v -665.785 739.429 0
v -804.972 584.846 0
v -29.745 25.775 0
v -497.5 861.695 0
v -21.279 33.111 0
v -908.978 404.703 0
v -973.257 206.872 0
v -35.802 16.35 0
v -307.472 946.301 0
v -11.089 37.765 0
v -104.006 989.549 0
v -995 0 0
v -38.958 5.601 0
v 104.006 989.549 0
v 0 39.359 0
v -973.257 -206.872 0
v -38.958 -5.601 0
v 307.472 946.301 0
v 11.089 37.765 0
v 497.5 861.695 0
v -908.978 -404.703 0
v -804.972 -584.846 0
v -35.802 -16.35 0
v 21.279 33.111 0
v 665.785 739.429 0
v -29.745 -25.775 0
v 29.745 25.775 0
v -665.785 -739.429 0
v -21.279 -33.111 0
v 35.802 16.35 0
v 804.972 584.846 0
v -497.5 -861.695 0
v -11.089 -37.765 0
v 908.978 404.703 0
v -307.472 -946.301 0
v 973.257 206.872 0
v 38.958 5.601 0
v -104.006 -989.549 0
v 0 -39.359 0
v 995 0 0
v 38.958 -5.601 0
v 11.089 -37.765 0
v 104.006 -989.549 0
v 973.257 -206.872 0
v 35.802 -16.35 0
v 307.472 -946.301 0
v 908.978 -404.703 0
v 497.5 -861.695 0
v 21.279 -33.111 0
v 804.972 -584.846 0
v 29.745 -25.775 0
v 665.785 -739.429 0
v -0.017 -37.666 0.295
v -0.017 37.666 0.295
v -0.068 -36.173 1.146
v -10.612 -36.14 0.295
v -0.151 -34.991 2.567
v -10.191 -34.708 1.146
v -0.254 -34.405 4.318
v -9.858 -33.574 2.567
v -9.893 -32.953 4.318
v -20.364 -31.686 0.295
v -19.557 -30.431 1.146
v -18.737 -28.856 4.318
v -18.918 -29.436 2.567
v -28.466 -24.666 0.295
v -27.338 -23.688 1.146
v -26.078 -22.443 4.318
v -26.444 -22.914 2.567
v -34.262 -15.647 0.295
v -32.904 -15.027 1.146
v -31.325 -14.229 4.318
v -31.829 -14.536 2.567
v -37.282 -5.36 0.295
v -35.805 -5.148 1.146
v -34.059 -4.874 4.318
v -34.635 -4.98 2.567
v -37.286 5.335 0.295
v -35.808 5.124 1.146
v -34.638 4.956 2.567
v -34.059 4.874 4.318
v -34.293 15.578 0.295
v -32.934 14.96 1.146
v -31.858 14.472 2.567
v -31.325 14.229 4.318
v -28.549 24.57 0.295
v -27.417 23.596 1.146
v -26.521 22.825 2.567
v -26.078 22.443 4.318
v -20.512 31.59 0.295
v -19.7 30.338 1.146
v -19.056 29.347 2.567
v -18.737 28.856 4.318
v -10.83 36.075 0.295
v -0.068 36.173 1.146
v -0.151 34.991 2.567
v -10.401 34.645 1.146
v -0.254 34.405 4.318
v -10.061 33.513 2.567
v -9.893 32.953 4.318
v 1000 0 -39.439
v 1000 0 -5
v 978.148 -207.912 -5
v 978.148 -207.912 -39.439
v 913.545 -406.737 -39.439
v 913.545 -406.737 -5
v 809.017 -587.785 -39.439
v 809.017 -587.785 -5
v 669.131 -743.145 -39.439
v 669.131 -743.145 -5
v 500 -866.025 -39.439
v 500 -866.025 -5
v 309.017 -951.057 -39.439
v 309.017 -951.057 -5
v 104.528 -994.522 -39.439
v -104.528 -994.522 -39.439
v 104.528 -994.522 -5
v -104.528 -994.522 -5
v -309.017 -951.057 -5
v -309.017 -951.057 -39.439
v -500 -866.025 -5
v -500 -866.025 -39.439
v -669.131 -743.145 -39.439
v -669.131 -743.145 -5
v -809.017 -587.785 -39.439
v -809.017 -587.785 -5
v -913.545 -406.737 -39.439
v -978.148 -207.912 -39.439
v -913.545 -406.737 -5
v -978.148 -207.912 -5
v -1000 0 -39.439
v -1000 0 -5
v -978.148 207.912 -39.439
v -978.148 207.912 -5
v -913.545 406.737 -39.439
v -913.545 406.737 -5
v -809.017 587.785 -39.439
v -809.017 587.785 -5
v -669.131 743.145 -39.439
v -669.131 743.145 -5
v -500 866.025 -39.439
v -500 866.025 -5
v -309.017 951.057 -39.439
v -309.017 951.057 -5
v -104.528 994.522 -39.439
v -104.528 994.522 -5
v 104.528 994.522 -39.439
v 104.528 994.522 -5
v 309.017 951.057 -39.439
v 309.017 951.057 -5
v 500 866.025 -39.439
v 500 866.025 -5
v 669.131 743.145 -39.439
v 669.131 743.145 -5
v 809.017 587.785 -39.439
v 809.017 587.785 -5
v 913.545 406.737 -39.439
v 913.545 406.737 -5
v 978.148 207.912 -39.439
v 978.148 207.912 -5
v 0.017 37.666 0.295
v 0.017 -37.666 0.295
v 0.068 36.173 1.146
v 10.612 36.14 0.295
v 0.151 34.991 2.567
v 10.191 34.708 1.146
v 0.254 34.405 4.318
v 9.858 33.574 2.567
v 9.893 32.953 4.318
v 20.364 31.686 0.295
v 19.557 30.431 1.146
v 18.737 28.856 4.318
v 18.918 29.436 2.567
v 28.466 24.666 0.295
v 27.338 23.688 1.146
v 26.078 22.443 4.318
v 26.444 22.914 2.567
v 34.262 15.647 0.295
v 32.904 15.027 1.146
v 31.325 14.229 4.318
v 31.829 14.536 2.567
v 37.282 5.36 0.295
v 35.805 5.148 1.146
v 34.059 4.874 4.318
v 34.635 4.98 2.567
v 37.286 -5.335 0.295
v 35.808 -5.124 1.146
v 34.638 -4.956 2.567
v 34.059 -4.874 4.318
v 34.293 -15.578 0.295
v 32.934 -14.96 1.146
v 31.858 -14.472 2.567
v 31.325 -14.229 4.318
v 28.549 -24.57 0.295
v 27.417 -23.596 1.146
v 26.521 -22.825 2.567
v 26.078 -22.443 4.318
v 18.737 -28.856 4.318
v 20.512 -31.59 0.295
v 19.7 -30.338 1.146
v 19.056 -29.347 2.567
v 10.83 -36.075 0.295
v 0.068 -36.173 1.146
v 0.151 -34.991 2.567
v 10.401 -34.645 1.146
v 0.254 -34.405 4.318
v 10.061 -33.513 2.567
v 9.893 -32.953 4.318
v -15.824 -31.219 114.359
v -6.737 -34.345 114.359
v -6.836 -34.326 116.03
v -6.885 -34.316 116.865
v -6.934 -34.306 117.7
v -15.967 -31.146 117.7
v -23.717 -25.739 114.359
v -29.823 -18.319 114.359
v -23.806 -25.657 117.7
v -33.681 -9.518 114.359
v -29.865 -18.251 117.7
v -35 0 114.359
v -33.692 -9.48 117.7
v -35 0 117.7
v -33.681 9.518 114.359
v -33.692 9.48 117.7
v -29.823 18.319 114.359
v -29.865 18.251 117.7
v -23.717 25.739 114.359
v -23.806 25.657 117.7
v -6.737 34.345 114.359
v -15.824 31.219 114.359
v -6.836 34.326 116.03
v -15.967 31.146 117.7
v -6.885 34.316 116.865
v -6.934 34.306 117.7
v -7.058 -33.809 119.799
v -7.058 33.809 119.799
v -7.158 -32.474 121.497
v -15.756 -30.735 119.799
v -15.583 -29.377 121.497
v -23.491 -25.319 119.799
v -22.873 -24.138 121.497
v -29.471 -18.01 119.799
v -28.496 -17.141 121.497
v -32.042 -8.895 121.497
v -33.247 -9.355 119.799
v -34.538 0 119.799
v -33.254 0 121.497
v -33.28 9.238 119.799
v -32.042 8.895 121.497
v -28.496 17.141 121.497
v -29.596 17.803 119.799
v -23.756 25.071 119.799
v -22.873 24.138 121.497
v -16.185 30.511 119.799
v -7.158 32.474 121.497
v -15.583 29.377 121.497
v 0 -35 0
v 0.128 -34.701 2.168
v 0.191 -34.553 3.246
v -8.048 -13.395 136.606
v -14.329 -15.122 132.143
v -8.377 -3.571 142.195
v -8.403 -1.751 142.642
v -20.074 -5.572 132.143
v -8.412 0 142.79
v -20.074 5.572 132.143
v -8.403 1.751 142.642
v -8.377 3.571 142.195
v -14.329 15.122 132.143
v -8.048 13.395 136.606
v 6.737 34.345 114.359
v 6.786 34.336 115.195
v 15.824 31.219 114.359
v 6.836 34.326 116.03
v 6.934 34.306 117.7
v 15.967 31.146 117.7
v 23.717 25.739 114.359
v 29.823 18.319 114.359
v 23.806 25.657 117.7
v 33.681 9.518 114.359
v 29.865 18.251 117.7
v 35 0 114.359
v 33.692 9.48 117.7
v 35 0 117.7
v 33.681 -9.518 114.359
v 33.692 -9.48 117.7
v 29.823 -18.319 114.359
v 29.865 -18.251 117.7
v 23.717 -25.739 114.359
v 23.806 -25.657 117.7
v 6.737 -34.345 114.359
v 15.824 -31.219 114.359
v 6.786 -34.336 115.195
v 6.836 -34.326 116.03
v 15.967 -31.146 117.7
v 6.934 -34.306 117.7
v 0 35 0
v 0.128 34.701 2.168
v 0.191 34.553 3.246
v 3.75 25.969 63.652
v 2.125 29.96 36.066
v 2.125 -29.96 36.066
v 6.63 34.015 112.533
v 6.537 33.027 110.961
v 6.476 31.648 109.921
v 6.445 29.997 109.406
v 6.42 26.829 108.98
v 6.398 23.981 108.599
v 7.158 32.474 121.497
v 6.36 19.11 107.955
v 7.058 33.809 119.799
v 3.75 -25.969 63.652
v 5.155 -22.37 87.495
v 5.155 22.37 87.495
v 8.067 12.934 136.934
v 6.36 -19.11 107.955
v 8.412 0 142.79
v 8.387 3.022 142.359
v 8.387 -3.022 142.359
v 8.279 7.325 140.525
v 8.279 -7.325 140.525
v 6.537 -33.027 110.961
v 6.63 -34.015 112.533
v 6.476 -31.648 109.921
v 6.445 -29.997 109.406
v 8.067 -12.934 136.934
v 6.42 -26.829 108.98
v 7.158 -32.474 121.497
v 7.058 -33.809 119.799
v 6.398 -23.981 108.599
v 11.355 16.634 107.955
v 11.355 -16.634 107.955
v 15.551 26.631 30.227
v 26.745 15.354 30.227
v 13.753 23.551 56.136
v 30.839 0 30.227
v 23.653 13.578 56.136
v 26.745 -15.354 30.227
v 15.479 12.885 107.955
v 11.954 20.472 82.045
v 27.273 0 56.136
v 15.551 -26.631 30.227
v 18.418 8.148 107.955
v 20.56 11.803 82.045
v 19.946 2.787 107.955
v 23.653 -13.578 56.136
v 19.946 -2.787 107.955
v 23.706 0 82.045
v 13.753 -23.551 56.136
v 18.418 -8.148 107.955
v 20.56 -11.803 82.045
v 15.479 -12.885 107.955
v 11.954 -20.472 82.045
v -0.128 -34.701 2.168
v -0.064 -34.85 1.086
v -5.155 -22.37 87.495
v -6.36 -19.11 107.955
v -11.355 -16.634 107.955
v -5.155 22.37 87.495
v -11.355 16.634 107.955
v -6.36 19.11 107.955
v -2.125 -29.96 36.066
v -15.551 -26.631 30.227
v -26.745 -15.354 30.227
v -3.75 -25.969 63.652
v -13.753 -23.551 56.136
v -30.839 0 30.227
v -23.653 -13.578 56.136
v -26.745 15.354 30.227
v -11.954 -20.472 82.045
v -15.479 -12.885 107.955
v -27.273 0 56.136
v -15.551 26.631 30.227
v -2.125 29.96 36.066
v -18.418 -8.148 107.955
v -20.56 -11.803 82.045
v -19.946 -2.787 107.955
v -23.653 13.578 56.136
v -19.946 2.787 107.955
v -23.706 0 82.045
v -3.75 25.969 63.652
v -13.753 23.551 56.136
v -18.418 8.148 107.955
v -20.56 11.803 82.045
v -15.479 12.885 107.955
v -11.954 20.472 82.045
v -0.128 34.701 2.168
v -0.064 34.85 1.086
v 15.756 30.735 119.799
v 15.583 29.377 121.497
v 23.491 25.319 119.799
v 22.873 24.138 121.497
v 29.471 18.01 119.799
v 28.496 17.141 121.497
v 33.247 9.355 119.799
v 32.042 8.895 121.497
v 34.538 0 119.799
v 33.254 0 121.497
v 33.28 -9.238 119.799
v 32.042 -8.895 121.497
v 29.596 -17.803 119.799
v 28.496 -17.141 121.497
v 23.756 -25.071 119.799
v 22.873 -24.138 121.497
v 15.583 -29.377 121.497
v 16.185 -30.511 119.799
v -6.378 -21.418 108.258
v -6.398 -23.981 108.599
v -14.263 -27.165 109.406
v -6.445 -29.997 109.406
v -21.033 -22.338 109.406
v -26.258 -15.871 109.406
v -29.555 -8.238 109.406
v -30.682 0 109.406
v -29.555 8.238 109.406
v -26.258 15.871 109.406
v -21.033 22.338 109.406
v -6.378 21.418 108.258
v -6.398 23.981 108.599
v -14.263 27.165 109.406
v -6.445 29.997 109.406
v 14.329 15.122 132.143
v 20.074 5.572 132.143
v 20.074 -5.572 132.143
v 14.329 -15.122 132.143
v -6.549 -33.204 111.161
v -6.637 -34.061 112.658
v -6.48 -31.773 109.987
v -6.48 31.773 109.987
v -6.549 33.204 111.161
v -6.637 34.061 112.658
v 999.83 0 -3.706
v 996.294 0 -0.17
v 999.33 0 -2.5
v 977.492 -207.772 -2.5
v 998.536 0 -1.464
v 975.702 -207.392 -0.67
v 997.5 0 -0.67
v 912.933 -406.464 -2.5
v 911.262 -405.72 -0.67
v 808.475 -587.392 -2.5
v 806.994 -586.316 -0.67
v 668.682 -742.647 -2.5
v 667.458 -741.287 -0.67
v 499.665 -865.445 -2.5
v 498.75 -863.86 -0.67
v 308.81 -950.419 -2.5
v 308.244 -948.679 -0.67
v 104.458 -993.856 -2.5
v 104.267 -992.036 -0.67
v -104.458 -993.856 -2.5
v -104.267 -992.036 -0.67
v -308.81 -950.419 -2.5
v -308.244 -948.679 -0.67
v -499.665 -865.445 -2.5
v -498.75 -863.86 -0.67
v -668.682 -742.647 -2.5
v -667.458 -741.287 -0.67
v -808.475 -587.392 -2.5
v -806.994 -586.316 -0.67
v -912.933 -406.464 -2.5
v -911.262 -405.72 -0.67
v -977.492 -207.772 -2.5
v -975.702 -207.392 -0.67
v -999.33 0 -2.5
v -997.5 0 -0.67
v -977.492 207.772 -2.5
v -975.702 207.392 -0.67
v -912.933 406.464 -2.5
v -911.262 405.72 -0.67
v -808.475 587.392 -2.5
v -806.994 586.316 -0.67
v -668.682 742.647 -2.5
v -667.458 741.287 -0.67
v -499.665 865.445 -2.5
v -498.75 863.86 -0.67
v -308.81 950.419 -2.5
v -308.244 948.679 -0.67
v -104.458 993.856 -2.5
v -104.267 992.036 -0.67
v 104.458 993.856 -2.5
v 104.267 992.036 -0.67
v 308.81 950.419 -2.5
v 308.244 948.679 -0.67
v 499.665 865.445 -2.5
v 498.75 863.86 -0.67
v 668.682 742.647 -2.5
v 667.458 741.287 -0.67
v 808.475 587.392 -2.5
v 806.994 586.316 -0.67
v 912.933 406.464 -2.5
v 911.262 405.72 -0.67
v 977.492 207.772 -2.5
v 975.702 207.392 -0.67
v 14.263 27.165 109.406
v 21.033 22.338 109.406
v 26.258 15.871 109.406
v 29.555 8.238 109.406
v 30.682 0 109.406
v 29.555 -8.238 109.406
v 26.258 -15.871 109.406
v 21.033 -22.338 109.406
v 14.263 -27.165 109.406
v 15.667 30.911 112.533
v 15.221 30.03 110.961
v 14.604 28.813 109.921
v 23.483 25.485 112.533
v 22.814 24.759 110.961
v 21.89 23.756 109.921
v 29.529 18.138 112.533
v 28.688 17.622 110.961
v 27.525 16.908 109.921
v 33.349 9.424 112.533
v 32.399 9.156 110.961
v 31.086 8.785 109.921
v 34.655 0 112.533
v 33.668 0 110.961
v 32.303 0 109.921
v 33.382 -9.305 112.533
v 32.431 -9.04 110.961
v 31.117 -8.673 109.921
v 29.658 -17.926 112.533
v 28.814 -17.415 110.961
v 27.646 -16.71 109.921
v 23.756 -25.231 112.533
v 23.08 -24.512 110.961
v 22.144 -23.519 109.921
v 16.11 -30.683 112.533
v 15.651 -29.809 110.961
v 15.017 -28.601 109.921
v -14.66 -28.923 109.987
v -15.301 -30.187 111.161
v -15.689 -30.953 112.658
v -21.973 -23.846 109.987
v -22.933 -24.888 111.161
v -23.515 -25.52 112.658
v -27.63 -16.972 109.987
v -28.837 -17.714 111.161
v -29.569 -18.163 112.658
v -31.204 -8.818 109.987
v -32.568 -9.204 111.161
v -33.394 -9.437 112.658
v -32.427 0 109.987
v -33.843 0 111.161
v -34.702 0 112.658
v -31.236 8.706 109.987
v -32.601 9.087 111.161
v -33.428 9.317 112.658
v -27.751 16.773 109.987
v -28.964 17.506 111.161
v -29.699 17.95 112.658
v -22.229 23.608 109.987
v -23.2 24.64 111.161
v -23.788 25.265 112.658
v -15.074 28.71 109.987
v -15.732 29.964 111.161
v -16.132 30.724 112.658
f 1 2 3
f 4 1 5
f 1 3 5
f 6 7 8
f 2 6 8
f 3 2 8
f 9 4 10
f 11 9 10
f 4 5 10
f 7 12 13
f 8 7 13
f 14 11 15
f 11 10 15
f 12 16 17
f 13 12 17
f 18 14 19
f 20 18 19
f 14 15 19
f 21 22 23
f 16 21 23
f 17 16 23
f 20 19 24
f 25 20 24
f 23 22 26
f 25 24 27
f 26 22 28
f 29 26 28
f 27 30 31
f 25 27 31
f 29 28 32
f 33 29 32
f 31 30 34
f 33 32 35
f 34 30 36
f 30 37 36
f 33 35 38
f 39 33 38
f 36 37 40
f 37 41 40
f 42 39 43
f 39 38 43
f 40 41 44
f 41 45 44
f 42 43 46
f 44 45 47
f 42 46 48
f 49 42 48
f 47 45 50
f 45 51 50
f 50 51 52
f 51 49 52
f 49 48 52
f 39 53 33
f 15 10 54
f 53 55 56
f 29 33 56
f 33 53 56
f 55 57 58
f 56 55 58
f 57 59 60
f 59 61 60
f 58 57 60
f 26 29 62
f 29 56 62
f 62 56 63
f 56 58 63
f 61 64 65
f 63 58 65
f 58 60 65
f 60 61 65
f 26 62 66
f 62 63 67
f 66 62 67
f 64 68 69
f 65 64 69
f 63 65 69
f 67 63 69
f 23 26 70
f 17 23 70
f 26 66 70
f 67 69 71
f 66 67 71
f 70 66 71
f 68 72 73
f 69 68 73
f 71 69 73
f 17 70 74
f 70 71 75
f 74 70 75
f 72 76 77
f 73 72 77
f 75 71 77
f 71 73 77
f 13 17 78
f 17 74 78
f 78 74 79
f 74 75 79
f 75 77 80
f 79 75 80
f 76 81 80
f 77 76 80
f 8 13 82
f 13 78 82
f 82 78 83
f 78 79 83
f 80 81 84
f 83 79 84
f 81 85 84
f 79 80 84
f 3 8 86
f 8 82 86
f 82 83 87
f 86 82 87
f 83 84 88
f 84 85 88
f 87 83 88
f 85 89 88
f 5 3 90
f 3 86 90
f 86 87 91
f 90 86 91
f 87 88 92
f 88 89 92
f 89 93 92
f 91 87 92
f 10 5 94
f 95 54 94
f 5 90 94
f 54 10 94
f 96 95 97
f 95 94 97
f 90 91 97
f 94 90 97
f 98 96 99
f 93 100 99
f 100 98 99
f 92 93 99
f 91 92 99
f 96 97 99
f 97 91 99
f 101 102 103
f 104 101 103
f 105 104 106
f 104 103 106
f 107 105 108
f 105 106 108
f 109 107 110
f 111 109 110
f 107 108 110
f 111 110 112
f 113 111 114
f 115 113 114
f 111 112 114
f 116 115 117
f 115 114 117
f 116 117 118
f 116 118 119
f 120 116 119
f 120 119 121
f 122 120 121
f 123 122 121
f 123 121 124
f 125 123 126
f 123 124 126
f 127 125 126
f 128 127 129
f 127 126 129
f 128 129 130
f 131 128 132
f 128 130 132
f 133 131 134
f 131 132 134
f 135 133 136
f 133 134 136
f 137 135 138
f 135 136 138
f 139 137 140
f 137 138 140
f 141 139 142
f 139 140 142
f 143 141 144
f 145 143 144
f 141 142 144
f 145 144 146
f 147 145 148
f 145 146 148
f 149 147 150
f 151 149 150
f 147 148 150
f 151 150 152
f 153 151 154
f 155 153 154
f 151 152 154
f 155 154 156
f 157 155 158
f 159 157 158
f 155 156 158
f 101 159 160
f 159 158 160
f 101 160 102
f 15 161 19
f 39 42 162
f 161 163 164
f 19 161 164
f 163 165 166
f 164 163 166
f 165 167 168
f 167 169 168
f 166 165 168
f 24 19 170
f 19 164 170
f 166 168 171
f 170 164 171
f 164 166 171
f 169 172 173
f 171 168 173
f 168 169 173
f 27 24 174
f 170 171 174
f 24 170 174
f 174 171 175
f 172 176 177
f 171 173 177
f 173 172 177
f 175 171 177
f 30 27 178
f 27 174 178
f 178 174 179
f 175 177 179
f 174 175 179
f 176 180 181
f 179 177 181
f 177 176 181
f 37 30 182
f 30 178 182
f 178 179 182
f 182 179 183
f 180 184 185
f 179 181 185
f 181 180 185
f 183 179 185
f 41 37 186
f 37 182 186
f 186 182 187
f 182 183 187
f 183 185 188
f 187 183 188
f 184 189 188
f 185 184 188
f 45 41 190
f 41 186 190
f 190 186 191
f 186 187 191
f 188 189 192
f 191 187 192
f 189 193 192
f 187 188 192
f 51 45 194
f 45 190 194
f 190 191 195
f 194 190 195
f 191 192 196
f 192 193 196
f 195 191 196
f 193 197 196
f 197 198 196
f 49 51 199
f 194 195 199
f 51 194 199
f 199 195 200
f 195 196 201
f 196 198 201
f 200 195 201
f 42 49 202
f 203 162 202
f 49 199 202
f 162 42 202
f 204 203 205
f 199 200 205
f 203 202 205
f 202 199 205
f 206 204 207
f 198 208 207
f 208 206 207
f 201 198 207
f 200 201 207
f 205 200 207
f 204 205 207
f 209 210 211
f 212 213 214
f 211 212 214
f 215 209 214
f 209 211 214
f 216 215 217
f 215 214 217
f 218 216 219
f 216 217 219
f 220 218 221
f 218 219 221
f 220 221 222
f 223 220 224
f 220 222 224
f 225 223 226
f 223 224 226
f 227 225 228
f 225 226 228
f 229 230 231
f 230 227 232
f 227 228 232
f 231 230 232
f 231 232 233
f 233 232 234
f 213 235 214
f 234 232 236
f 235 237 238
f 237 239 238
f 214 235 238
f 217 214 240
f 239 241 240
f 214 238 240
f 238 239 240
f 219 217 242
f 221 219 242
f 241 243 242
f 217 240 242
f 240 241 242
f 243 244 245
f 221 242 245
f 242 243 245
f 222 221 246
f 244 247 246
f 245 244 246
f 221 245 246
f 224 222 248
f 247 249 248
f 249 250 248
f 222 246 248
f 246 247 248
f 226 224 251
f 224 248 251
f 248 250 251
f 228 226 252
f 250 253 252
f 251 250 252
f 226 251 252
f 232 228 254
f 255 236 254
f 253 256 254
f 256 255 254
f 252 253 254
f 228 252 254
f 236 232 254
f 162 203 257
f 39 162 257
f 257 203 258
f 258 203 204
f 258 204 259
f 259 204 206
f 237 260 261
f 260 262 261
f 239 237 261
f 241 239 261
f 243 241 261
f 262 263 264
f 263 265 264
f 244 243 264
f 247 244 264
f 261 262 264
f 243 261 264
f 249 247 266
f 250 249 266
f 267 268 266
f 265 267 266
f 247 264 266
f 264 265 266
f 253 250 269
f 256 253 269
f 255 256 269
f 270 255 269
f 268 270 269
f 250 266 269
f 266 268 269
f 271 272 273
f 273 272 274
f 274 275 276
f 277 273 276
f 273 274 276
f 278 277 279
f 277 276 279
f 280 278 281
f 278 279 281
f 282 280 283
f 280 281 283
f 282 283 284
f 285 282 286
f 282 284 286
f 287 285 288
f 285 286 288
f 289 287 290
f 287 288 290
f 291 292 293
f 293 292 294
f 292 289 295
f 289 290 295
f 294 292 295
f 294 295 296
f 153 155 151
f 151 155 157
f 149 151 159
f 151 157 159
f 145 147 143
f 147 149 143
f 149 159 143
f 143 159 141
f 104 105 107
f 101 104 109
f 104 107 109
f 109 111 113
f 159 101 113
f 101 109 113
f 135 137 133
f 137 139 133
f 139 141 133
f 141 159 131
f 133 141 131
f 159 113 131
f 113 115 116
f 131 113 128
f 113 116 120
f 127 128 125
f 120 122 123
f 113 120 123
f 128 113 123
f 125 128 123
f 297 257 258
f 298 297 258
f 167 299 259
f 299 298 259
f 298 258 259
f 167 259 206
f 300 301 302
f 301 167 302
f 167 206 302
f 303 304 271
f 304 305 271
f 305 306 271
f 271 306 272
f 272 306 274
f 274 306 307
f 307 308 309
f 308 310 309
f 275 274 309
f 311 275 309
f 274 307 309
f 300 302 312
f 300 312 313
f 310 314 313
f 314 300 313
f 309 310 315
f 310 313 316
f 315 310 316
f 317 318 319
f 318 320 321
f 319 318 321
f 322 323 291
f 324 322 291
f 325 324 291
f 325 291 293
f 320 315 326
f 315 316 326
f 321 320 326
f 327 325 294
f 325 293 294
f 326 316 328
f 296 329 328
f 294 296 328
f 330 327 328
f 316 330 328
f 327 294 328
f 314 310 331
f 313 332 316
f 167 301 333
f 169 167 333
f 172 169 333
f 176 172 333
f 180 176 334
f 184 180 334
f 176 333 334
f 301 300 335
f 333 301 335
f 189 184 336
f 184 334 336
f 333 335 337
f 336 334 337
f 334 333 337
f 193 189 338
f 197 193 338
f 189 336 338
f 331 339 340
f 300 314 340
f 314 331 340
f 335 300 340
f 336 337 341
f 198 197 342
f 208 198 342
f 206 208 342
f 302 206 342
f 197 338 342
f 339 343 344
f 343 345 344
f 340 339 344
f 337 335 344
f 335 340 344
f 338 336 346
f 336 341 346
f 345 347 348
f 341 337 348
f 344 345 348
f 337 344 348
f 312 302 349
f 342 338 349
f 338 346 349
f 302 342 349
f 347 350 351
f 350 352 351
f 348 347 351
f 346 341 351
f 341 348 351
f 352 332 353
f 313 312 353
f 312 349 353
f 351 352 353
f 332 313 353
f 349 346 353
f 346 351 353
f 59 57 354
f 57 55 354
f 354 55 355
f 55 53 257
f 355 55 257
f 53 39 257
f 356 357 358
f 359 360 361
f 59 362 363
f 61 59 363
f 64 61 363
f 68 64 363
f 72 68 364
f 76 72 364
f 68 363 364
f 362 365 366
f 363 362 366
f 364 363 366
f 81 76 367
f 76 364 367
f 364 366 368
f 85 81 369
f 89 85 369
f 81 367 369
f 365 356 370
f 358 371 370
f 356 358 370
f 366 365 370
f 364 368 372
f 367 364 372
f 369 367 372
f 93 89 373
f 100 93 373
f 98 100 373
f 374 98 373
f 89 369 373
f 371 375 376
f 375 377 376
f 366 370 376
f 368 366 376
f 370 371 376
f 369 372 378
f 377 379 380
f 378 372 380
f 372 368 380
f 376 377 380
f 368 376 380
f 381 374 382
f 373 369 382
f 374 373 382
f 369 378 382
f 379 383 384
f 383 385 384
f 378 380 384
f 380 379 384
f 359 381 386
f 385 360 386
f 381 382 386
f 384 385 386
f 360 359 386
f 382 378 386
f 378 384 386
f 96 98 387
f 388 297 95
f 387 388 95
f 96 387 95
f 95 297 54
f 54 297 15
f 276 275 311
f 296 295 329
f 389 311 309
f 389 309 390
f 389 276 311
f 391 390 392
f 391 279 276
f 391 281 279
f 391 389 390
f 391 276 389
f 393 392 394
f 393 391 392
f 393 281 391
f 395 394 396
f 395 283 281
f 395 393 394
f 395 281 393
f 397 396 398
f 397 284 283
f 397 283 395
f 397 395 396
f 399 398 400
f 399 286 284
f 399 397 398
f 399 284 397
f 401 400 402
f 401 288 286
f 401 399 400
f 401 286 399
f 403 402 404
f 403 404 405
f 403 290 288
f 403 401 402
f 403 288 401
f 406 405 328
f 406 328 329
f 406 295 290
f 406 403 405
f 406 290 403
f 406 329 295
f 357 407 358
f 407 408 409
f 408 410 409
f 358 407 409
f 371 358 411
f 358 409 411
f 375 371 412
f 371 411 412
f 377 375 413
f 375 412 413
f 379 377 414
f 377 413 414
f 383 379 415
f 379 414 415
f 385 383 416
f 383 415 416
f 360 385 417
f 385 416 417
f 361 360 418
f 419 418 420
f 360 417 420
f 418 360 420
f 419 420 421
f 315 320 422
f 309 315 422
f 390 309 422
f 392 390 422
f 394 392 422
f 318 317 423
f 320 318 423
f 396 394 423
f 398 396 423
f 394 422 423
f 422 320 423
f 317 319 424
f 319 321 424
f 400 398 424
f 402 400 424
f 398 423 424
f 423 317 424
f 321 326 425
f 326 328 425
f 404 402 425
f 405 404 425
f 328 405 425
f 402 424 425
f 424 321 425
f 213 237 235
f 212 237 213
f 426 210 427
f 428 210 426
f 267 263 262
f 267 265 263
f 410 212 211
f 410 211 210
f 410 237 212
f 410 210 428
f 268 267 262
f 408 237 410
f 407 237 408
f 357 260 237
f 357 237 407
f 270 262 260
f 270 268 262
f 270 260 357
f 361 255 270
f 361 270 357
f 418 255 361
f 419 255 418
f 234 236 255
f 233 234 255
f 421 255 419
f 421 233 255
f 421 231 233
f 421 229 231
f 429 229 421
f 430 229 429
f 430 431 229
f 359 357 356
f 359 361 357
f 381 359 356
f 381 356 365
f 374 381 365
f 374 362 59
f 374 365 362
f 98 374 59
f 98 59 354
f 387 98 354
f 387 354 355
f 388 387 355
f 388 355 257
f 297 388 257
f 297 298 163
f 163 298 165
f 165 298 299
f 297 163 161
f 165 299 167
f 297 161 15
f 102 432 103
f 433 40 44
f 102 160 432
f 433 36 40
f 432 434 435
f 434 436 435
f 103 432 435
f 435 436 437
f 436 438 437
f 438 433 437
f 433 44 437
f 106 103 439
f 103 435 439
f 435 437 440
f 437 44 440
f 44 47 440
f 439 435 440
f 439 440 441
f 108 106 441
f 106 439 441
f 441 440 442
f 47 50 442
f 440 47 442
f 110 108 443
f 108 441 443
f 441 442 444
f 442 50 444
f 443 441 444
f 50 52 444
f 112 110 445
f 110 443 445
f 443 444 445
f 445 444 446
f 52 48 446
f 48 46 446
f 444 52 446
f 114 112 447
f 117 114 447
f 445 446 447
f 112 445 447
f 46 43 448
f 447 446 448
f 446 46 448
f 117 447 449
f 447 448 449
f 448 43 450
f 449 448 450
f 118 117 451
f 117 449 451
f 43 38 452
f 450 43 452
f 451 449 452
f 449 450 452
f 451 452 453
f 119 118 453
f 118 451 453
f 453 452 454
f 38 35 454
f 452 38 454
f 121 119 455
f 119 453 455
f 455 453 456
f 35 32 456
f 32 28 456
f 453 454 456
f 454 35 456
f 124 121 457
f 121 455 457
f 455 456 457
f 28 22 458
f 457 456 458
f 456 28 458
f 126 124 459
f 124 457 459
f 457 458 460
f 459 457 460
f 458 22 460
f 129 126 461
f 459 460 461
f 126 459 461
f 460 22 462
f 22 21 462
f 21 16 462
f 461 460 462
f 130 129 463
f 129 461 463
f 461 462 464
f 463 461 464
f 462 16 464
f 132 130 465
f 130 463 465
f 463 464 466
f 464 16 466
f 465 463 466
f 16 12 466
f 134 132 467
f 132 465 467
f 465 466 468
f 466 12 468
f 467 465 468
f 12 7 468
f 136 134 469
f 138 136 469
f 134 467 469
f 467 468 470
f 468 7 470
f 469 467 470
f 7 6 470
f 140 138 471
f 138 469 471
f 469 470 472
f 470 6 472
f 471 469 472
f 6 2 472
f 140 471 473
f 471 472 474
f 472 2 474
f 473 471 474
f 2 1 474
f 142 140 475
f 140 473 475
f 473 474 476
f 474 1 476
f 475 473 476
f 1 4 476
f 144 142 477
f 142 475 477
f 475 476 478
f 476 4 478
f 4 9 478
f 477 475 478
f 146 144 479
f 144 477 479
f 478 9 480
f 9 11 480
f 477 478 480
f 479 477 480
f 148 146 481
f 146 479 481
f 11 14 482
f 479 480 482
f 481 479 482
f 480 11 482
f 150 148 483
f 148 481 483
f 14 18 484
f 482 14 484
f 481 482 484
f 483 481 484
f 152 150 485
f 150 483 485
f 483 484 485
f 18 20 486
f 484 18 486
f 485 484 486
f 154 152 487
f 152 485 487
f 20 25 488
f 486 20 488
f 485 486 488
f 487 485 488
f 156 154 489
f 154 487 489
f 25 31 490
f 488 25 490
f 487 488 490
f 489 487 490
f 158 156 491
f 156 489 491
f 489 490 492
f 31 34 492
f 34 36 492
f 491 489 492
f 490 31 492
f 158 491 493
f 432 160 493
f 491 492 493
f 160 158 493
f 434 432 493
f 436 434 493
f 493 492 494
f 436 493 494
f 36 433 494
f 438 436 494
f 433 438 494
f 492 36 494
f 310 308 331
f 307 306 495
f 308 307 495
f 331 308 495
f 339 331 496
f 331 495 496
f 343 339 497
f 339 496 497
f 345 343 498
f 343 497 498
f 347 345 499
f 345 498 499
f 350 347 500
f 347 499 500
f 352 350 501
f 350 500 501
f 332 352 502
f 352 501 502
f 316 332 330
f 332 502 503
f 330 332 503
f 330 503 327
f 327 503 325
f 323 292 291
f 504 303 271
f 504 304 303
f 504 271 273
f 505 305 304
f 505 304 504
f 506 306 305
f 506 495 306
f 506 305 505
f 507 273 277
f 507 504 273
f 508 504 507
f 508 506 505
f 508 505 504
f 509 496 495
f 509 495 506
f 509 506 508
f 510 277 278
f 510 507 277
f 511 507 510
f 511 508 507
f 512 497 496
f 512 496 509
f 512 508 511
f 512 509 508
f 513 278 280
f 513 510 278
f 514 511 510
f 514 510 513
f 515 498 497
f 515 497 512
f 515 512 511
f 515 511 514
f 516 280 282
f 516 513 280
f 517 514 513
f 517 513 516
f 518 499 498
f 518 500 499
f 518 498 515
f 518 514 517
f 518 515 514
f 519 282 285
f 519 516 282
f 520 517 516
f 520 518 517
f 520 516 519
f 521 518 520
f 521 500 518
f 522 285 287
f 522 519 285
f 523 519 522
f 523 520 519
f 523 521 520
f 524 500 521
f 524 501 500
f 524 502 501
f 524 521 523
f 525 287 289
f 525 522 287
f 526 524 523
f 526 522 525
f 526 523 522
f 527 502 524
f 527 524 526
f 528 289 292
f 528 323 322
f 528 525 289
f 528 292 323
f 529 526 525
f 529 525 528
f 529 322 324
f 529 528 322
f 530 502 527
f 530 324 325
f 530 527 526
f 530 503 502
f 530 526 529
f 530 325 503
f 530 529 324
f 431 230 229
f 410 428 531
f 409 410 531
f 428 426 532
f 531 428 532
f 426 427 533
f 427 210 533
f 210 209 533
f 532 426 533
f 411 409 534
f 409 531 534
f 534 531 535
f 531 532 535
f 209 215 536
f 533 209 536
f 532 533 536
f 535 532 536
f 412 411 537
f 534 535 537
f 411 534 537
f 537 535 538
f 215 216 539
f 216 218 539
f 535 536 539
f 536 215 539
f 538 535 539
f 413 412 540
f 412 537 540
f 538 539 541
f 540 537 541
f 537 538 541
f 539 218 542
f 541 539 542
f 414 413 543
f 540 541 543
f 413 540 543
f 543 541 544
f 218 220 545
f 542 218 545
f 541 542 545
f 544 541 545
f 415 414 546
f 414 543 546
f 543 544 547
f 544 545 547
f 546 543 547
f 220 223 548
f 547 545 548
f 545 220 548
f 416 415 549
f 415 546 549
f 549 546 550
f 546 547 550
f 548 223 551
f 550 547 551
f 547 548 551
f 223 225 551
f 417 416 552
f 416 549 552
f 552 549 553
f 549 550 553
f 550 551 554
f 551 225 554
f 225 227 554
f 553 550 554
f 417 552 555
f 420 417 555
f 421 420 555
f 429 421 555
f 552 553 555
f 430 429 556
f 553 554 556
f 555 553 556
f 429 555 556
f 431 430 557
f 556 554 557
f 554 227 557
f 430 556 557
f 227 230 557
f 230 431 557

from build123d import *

# Parameters (mm, degrees)
F3_DEPTH      = 1000.001
F3_DEPTH_BACK = 1000.001
F4_T4_ANGLE   = 180
F4_T9_ANGLE   = 180
F4_T12_ANGLE  = 175.5397265939
F4_T14_ANGLE  = 175.5397265939
F4_T16_ANGLE  = 194.3823817652
F4_T18_ANGLE  = 194.3823817652


# Not quite as in the source:
# - a fillet or chamfer that OpenCascade refuses, or shapes differently, is made with other operations: its cross-section is extruded or revolved along the edge and cut away or added


with BuildPart() as f1:
    # F0 (on Front) → F1 (revolve)
    with BuildSketch(Plane.XZ):
        Polygon((0, 150), (0, 0), (35, 0), (20.1401172379, 107.9545454545), (35, 110), (35, 120), align=None)
        Polygon((35, 0), (0, 0), (0, -39.4391342998), (1000, -39.4391342998), (1000, 0), align=None)
    revolve(axis=Axis((0, 0, 75), (0, 0, -1)))

    # F2 (on Front) → F3 (cut, two sides)
    with BuildSketch(Plane.XZ) as f3_sk:
        Polygon((-9.2637268826, 157.2448909283), (0, 0), (9.2637268826, 157.2448909283), (0, 157.7906424325), align=None)
    extrude(amount=F3_DEPTH, mode=Mode.SUBTRACT)
    extrude(f3_sk.sketch, amount=-F3_DEPTH_BACK, mode=Mode.SUBTRACT)

    # F4: fillet of radius 5 on 7 edges, made by hand


with BuildPart() as f4_tool2:
    # F4_s3 → F4_t4 (revolve)
    with BuildSketch(Plane.YZ):
        with BuildLine():
            ThreePointArc((39.3588989435, 0), (36.0732552402, 1.2311081928), (34.4056046895, 4.3181818182))
            Line((34.4056046895, 4.3181818182), (35, 0))
            Line((35, 0), (39.3588989435, 0))
        make_face()
    revolve(axis=Axis((0, 0, 0), (0, 0, -1)), revolution_arc=F4_T4_ANGLE)

    split(bisect_by=Plane(origin=(0, 0, 0), x_dir=(0, 1, 0), z_dir=(0.9982691489, 0, -0.0588107677)), keep=Keep.TOP)


with BuildPart() as f1_1:
    add(f1.part)

    # F4_t1: union F4_tool2
    add(f4_tool2.part)


with BuildPart() as f4_tool7:
    # F4_s8 → F4_t9 (revolve)
    with BuildSketch(Plane.YZ):
        with BuildLine():
            ThreePointArc((-39.3588989435, 0), (-36.0732552402, 1.2311081928), (-34.4056046895, 4.3181818182))
            Line((-34.4056046895, 4.3181818182), (-35, 0))
            Line((-35, 0), (-39.3588989435, 0))
        make_face()
    revolve(axis=Axis((0, 0, 0), (0, 0, -1)), revolution_arc=F4_T9_ANGLE)

    split(bisect_by=Plane(origin=(0, 0, 0), x_dir=(0, 1, 0), z_dir=(-0.9982691489, 0, -0.0588107677)), keep=Keep.TOP)


with BuildPart() as f1_2:
    add(f1_1.part)

    # F4_t6: union F4_tool7
    add(f4_tool7.part)

    # F4_s11 → F4_t12 (revolve, cut)
    with BuildSketch(Plane(origin=(0, 0, 0), x_dir=(0, 0, 1), z_dir=(-0.9992425868, 0.0389134008, 0))):
        with BuildLine():
            ThreePointArc((121.4966083995, 33.2539568673), (119.7896094353, 34.5425644925), (117.7003253876, 35))
            Line((117.7003253876, 35), (120, 35))
            Line((120, 35), (121.4966083995, 33.2539568673))
        make_face()
    revolve(axis=Axis((0, 0, 120), (0, 0, -1)), revolution_arc=F4_T12_ANGLE, mode=Mode.SUBTRACT)

    # F4_s13 → F4_t14 (revolve, cut)
    with BuildSketch(Plane(origin=(0, 0, 0), x_dir=(0, 0, 1), z_dir=(0.9992425868, -0.0389134008, 0))):
        with BuildLine():
            ThreePointArc((117.7003253876, 35), (119.7896094353, 34.5425644925), (121.4966083995, 33.2539568673))
            Line((121.4966083995, 33.2539568673), (120, 35))
            Line((120, 35), (117.7003253876, 35))
        make_face()
    revolve(axis=Axis((0, 0, 120), (0, 0, -1)), revolution_arc=F4_T14_ANGLE, mode=Mode.SUBTRACT)

    # F4_s15 → F4_t16 (revolve, cut)
    with BuildSketch(Plane(origin=(0, 0, 0), x_dir=(0, 0, 1), z_dir=(0.9921339593, 0.1251806963, 0))):
        with BuildLine():
            ThreePointArc((109.4056046895, 30.6818181818), (111.0732552402, 33.7688918072), (114.3588989435, 35))
            Line((114.3588989435, 35), (110, 35))
            Line((110, 35), (109.4056046895, 30.6818181818))
        make_face()
    revolve(axis=Axis((0, 0, 110), (0, 0, -1)), revolution_arc=F4_T16_ANGLE, mode=Mode.SUBTRACT)

    # F4_s17 → F4_t18 (revolve, cut)
    with BuildSketch(Plane(origin=(0, 0, 0), x_dir=(0, 0, 1), z_dir=(-0.9921339593, -0.1251806963, 0))):
        with BuildLine():
            ThreePointArc((114.3588989435, 35), (111.0732552402, 33.7688918072), (109.4056046895, 30.6818181818))
            Line((109.4056046895, 30.6818181818), (110, 35))
            Line((110, 35), (114.3588989435, 35))
        make_face()
    revolve(axis=Axis((0, 0, 110), (0, 0, -1)), revolution_arc=F4_T18_ANGLE, mode=Mode.SUBTRACT)

    # F4_s19 → F4_t20 (revolve, cut)
    with BuildSketch(Plane.XZ):
        with BuildLine():
            ThreePointArc((1000, -5), (998.5355339059, -1.4644660941), (995, 0))
            Line((995, 0), (1000, 0))
            Line((1000, 0), (1000, -5))
        make_face()
    revolve(axis=Axis((0, 0, 0), (0, 0, -1)), mode=Mode.SUBTRACT)


solid = f1_2.part
